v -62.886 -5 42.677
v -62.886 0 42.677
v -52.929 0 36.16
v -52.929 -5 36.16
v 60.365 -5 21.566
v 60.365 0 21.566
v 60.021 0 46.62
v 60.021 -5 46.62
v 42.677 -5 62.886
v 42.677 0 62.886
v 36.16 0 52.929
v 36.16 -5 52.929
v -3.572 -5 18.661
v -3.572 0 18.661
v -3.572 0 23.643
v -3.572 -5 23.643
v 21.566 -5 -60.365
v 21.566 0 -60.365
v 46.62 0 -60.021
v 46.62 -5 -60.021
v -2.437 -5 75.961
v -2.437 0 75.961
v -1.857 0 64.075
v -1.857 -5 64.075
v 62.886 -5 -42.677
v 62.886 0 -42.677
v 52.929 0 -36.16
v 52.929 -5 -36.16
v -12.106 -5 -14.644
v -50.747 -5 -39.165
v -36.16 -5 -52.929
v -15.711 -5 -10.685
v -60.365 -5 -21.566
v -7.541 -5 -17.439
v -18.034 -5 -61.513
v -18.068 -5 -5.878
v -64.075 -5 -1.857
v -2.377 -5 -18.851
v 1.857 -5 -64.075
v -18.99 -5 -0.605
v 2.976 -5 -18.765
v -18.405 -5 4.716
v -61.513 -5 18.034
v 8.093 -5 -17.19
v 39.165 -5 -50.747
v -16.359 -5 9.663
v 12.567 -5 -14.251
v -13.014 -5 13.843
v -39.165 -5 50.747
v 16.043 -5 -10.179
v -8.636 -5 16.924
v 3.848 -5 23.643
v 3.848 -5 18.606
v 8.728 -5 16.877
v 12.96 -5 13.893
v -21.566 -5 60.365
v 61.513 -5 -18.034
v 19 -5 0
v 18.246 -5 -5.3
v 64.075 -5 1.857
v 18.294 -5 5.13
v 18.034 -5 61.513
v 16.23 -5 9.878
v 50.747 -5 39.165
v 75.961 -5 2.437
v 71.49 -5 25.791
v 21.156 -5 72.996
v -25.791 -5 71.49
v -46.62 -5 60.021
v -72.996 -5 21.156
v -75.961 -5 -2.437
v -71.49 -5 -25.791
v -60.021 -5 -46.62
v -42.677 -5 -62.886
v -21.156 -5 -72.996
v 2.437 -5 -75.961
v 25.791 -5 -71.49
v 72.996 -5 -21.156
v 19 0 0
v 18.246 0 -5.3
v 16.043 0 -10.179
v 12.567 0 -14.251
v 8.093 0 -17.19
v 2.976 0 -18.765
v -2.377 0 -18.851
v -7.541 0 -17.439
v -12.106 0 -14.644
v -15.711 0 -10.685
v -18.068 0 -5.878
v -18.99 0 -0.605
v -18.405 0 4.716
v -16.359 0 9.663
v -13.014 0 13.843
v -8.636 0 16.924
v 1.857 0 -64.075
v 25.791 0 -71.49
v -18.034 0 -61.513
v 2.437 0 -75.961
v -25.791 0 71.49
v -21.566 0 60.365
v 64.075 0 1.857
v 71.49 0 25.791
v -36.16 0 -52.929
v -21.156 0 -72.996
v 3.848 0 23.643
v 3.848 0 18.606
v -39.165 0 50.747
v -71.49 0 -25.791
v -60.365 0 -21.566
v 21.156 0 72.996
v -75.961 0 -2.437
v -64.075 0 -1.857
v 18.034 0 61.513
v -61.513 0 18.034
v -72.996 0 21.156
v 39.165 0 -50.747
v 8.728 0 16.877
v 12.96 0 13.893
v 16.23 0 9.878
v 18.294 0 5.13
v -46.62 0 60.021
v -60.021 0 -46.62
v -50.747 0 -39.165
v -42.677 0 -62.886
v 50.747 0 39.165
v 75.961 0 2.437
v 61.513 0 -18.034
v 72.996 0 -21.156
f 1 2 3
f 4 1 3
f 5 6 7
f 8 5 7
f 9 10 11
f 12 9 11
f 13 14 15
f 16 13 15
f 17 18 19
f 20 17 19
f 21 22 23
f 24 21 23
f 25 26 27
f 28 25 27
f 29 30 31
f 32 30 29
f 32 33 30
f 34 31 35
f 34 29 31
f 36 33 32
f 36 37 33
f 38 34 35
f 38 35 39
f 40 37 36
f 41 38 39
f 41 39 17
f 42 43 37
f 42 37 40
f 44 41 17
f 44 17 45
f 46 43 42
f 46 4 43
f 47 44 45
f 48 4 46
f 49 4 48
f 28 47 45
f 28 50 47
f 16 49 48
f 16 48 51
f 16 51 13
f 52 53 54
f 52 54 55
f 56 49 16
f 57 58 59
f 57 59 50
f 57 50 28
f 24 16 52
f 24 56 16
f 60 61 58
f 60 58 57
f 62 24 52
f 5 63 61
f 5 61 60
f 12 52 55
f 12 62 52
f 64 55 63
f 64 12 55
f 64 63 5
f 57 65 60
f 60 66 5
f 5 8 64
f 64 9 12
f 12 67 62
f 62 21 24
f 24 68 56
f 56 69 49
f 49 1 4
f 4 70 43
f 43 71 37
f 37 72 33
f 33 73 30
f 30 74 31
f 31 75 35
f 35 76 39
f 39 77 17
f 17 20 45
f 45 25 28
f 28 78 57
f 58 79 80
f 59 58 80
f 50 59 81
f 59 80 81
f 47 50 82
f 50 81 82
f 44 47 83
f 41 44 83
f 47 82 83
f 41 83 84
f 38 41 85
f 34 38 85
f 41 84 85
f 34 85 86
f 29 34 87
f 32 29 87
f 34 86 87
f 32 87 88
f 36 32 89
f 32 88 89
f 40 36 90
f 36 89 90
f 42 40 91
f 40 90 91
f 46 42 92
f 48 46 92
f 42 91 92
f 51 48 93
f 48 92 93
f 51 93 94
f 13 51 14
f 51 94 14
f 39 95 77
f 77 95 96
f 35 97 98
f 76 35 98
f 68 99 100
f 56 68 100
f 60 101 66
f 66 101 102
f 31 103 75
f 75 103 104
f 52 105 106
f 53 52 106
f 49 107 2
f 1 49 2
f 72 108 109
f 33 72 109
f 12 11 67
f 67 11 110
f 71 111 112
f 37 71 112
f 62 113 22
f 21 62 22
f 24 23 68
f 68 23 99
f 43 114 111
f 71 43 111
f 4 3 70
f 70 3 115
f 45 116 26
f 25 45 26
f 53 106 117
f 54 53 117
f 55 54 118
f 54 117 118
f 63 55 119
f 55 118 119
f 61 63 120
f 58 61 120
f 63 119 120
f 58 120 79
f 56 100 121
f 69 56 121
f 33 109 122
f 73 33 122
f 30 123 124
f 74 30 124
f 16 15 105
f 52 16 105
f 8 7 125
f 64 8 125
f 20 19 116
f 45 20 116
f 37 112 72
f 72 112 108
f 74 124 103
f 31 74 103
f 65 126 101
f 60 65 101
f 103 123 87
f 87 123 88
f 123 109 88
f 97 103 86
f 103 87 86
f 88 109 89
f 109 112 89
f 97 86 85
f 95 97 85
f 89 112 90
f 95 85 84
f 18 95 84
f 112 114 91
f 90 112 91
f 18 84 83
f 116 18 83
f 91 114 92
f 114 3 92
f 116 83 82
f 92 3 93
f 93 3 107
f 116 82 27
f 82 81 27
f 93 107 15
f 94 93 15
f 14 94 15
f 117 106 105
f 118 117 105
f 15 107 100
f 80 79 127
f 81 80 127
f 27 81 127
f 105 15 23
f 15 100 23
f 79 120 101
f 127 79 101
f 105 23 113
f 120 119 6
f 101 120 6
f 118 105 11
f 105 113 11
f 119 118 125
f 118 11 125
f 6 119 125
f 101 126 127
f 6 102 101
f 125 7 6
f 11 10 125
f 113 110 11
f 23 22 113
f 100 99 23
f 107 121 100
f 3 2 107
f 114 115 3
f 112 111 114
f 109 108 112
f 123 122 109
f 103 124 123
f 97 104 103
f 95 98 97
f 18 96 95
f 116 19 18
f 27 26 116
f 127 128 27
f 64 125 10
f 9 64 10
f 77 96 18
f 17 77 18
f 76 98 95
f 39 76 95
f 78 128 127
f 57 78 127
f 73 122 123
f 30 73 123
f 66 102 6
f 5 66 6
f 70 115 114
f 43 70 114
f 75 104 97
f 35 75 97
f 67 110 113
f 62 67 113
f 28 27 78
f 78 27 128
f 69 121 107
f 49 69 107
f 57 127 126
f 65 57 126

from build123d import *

# Parameters (mm, degrees)
F1_DEPTH = 5


with BuildPart() as f1:
    # F0 (on Front) → F1 (new body)
    with BuildSketch(Plane.XZ):
        Polygon((61.512955, -18.03444), (75.960928, 2.436688), (64.075245, 1.856776), (71.490157, 25.790645), (60.365404, 21.566239), (60.021432, 46.620035), (50.746576, 39.164648), (42.677391, 62.885931), (36.16032, 52.929348), (21.15579, 72.996113), (18.03444, 61.512955), (-2.436688, 75.960928), (-1.856776, 64.075245), (-25.790645, 71.490157), (-21.566239, 60.365404), (-46.620035, 60.021432), (-39.164648, 50.746576), (-62.885931, 42.677391), (-52.929348, 36.16032), (-72.996113, 21.15579), (-61.512955, 18.03444), (-75.960928, -2.436688), (-64.075245, -1.856776), (-71.490157, -25.790645), (-60.365404, -21.566239), (-60.021432, -46.620035), (-50.746576, -39.164648), (-42.677391, -62.885931), (-36.16032, -52.929348), (-21.15579, -72.996113), (-18.03444, -61.512955), (2.436688, -75.960928), (1.856776, -64.075245), (25.790645, -71.490157), (21.566239, -60.365404), (46.620035, -60.021432), (39.164648, -50.746576), (62.885931, -42.677391), (52.929348, -36.16032), (72.996113, -21.15579), align=None)
        with BuildLine():
            ThreePointArc((3.847568, 18.606349), (14.732681, 11.997837), (19, 0))
            ThreePointArc((19, 0), (-12.106443, -14.643566), (-3.572003, 18.661211))
            Line((-3.572003, 18.661211), (-3.572003, 23.642808))
            Line((-3.572003, 23.642808), (3.847568, 23.642808))
            Line((3.847568, 23.642808), (3.847568, 18.606349))
        make_face(mode=Mode.SUBTRACT)
    extrude(amount=F1_DEPTH)


solid = f1.part
